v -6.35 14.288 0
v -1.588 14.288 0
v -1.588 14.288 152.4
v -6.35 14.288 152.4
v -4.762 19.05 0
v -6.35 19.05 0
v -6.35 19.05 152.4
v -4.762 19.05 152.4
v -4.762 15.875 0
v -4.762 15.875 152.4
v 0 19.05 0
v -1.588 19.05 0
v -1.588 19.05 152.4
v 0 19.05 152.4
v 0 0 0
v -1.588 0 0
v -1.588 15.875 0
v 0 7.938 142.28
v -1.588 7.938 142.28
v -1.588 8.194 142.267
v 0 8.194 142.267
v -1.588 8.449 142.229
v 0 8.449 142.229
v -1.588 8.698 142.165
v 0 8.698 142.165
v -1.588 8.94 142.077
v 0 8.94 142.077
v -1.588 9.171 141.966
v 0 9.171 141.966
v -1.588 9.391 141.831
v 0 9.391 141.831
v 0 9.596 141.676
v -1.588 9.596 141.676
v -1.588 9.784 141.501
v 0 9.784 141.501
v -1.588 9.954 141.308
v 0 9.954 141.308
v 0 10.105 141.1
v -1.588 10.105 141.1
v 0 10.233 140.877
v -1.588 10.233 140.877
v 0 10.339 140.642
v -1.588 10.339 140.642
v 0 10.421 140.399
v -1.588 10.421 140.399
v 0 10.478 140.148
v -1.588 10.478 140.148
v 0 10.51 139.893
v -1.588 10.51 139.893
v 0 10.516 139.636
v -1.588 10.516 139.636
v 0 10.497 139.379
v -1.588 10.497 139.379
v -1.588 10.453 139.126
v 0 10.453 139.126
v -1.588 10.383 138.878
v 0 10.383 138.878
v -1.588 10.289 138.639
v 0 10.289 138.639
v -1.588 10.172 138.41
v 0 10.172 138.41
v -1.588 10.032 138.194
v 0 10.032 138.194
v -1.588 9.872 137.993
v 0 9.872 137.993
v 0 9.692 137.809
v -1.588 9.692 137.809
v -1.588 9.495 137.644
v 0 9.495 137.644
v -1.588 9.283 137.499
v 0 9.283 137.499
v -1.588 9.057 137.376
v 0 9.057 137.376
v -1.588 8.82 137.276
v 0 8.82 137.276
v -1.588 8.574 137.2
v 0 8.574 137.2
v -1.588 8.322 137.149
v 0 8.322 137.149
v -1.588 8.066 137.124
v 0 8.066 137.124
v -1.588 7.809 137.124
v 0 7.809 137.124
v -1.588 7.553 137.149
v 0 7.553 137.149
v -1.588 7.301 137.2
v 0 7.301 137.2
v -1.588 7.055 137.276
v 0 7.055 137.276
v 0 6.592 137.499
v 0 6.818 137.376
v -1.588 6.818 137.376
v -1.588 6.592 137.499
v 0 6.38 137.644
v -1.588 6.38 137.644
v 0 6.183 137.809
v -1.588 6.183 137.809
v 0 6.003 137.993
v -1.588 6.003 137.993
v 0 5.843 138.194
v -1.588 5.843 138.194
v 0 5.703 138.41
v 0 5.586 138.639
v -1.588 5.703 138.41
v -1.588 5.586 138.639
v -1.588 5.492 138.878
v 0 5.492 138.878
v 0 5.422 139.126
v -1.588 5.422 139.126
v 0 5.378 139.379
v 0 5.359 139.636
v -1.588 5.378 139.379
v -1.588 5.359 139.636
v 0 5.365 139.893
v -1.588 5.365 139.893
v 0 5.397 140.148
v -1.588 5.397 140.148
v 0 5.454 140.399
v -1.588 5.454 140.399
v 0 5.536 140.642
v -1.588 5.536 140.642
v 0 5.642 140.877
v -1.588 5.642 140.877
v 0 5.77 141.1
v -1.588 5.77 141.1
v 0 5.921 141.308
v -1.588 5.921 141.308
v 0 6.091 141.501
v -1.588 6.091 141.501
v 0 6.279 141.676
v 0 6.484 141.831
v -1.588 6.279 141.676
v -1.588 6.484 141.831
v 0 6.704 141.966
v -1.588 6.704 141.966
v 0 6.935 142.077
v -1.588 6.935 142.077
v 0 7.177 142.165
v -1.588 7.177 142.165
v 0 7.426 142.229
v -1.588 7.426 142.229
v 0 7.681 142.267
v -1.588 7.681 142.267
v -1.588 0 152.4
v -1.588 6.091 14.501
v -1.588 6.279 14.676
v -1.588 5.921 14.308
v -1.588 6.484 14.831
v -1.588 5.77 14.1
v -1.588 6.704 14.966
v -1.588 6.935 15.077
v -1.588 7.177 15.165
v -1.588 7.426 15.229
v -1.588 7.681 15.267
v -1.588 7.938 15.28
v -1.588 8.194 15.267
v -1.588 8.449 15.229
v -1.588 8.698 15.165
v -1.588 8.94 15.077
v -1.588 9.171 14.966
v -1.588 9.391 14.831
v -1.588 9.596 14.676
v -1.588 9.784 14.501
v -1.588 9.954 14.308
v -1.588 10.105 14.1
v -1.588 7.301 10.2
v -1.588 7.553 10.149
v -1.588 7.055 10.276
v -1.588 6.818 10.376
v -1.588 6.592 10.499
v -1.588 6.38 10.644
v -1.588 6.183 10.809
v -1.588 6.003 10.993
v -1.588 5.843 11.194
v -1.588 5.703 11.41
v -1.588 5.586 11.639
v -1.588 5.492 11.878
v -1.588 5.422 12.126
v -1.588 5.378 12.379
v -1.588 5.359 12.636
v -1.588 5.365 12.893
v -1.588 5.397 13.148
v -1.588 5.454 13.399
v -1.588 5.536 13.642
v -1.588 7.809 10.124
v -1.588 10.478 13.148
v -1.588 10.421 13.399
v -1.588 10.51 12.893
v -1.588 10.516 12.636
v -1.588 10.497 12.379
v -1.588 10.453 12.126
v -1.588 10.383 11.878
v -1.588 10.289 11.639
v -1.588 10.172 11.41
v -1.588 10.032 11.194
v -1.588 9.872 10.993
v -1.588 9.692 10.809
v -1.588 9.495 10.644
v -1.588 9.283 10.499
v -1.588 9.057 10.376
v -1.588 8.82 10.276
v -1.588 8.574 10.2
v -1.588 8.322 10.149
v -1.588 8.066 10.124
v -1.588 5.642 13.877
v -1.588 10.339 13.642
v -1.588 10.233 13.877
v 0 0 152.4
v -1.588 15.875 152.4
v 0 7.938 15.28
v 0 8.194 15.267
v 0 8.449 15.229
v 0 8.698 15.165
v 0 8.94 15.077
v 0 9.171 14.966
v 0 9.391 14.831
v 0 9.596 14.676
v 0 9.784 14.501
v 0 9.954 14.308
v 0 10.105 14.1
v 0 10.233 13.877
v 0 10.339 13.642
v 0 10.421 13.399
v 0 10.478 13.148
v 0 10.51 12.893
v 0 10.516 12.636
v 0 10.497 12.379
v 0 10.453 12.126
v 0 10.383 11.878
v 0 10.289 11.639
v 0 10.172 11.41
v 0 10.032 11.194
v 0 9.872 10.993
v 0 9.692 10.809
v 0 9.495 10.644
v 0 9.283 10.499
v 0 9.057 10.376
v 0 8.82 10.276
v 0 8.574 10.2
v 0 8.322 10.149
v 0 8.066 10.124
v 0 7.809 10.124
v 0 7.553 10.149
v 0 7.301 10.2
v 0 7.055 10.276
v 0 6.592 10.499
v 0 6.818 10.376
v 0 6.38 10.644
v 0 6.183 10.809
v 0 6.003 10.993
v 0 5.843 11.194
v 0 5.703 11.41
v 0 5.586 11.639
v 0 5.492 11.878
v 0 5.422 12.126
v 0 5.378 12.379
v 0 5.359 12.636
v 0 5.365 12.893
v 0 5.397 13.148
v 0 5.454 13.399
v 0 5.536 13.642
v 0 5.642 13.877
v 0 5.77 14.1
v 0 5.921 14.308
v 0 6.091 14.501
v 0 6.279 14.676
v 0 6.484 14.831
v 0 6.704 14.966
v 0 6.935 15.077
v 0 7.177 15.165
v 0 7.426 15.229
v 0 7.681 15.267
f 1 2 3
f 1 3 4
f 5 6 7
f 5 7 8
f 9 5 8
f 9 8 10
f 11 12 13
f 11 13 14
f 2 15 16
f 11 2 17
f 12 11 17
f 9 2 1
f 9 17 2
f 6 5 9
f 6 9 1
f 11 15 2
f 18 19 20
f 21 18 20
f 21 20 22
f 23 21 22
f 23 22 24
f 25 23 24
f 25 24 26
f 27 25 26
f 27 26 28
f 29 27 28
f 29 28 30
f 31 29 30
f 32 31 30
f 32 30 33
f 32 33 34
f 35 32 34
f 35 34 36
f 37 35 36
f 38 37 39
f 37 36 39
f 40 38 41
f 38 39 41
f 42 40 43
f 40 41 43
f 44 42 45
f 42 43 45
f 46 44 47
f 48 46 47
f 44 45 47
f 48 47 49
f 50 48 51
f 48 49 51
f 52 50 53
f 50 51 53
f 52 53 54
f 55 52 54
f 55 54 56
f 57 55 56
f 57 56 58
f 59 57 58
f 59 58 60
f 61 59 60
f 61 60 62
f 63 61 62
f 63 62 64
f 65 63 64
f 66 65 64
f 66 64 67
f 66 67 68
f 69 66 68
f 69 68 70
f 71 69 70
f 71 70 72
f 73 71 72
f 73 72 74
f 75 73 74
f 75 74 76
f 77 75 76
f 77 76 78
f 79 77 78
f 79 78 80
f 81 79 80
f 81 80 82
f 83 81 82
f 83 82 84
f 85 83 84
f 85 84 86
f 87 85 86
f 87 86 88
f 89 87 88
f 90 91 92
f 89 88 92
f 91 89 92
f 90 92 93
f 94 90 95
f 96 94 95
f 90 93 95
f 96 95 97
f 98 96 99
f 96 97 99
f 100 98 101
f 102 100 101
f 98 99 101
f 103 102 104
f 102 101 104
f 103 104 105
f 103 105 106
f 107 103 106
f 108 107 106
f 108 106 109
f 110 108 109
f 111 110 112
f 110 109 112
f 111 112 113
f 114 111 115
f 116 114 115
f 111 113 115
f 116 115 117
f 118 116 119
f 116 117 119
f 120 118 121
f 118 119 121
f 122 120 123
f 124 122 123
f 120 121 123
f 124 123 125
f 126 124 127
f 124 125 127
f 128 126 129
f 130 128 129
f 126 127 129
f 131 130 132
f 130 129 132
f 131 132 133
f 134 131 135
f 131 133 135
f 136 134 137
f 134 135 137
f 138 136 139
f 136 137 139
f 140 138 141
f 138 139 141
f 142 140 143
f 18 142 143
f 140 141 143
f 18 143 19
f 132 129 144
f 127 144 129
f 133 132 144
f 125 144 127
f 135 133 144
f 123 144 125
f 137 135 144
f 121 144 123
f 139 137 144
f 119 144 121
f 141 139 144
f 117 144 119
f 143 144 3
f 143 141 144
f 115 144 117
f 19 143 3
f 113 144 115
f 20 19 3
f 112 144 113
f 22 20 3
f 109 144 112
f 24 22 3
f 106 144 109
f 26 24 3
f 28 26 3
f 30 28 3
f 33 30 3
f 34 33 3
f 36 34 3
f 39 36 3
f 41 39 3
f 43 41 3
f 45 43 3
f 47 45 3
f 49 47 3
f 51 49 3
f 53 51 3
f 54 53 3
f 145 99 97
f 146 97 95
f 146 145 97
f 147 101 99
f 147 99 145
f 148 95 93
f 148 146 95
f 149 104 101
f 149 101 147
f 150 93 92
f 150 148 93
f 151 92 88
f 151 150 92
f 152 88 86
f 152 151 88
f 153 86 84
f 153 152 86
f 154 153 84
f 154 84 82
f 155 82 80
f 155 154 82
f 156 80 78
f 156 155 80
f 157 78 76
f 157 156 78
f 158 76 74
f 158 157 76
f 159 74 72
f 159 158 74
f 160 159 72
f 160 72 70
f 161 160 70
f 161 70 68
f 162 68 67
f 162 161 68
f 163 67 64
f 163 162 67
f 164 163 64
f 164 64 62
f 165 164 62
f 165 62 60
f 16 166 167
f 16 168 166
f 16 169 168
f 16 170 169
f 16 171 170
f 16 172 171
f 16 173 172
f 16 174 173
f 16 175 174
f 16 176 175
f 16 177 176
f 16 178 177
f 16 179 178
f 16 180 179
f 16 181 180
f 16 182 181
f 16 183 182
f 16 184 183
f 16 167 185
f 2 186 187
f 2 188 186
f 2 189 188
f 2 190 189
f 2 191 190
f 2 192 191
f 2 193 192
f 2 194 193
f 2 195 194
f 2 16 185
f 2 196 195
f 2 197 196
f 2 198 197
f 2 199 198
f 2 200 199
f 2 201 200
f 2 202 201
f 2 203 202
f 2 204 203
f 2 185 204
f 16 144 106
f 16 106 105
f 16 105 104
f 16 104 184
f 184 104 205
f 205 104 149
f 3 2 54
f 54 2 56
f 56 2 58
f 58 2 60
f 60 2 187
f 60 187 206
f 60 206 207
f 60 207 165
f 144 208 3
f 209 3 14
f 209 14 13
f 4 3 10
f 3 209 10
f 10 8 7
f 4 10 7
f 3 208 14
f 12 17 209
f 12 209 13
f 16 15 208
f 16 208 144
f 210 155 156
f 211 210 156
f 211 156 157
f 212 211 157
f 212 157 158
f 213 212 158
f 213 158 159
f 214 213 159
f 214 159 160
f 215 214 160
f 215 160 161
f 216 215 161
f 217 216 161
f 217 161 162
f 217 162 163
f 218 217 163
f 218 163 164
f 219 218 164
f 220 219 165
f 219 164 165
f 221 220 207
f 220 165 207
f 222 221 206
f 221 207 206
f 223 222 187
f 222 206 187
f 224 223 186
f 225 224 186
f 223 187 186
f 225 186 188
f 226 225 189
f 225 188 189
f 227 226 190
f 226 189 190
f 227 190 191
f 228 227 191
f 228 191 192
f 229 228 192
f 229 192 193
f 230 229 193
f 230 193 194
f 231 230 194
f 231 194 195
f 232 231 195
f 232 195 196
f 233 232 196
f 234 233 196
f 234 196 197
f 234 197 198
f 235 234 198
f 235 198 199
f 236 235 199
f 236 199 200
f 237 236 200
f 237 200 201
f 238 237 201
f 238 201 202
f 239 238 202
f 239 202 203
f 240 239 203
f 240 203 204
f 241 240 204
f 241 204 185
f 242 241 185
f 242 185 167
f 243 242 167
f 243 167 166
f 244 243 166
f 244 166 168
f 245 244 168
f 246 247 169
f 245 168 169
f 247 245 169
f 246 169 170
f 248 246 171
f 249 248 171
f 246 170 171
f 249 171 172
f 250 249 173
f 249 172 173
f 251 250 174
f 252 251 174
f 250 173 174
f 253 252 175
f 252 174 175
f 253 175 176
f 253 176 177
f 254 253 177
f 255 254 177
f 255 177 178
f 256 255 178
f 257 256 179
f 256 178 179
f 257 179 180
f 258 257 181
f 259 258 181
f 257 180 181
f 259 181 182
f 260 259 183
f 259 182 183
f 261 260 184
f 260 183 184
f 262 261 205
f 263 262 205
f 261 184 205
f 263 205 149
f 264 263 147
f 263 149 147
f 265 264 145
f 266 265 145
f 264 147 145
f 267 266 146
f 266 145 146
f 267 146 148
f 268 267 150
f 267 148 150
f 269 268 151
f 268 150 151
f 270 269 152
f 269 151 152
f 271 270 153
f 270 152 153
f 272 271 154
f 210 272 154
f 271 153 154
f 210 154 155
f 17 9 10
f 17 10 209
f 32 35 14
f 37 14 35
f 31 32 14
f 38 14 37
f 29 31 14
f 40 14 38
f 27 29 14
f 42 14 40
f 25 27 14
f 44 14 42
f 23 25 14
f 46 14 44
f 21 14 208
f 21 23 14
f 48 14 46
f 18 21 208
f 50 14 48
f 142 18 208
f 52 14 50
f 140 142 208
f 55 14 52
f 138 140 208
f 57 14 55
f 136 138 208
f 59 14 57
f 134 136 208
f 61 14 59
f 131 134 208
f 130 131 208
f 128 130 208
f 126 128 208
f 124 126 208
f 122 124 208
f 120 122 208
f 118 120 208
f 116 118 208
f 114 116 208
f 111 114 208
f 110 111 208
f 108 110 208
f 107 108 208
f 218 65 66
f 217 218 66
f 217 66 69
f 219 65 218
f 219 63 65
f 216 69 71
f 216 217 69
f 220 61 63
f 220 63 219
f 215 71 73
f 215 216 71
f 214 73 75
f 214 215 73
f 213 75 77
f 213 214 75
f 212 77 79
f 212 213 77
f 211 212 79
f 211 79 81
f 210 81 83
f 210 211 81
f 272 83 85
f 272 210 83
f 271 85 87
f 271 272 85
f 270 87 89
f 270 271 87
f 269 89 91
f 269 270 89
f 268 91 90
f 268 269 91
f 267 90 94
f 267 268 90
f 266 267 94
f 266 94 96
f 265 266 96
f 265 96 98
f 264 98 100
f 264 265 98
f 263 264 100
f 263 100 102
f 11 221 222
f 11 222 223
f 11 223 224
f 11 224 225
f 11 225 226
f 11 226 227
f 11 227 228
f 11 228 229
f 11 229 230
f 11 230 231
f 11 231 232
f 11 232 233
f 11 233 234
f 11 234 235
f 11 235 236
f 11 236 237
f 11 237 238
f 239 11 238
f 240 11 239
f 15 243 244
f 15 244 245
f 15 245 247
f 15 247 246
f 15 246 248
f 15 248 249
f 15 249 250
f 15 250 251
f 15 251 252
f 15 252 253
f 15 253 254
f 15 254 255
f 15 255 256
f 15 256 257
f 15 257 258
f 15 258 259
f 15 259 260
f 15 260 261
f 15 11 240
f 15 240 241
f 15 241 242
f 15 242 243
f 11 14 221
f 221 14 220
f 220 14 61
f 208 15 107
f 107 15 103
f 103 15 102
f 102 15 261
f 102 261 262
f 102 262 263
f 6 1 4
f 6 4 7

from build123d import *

# Parameters (mm, degrees)
BOSS_EXTRUDE1_DEPTH = 152.4
SKETCH2_R           = 2.5796875
CUT_EXTRUDE1_DEPTH  = 2.5875


with BuildPart() as part:
    # Sketch1 → Boss-Extrude1 (new body)
    with BuildSketch(Plane.XY):
        Polygon((-6.35, 19.05), (-4.7625, 19.05), (-4.7625, 15.875), (-1.5875, 15.875), (-1.5875, 19.05), (0, 19.05), (0, 0), (-1.5875, 0), (-1.5875, 14.2875), (-6.35, 14.2875), align=None)
    extrude(amount=BOSS_EXTRUDE1_DEPTH)

    # Sketch2 → Cut-Extrude1 (cut, through all)
    with BuildSketch(Plane.ZY.offset(1.5875)):
        with Locations((12.7, 7.9375)):
            Circle(SKETCH2_R)
        with Locations((139.7, 7.9375)):
            Circle(SKETCH2_R)
    extrude(amount=-CUT_EXTRUDE1_DEPTH, mode=Mode.SUBTRACT)


solid = part.part
